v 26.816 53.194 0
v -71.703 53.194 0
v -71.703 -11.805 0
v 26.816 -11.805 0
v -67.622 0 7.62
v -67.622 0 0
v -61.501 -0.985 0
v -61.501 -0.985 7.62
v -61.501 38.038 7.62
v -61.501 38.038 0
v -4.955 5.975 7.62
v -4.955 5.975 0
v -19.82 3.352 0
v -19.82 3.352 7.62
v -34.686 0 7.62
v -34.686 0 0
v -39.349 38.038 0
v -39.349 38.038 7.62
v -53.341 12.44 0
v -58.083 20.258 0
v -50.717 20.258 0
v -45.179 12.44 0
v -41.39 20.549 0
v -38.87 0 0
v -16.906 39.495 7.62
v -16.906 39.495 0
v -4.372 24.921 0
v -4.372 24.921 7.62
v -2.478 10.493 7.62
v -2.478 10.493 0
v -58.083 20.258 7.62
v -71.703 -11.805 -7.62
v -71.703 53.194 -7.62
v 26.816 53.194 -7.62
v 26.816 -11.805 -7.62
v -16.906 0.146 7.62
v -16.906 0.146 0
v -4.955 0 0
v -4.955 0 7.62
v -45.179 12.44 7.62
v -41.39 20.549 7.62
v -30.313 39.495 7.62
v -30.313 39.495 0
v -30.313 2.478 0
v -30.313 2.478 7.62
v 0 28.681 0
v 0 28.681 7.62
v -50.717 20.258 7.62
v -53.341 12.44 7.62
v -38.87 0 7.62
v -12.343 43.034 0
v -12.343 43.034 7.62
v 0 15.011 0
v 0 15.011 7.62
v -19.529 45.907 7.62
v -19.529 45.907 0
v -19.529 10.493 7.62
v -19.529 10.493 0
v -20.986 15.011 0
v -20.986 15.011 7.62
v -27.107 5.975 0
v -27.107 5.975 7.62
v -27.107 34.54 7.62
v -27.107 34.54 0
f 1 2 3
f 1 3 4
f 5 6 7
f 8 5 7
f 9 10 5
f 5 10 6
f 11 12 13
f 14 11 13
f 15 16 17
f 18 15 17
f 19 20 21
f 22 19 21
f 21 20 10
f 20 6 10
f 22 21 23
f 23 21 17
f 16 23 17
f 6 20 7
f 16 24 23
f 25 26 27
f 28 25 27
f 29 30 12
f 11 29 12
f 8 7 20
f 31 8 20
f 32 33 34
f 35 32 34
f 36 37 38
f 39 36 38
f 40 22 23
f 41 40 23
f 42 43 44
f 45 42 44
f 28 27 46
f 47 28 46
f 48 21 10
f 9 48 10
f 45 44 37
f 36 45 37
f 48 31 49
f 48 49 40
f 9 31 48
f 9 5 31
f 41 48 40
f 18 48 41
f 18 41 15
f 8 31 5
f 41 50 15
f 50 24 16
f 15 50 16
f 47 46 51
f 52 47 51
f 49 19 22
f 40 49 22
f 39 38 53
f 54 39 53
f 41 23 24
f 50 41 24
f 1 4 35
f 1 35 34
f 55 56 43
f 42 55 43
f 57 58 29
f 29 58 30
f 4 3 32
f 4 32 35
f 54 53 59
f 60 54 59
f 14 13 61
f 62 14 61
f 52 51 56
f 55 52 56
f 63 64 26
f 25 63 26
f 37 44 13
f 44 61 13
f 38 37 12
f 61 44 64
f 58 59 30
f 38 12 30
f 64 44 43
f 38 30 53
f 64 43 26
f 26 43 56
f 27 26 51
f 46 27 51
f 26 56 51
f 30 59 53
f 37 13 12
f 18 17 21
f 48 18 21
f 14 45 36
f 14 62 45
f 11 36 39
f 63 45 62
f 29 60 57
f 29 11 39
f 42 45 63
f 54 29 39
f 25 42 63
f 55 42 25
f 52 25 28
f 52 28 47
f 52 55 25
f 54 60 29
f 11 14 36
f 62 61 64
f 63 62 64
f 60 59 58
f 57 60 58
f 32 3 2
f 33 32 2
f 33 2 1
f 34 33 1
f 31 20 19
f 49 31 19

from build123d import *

# Parameters (mm, degrees)
F1_DEPTH = 7.62
F2_W     = 98.518687
F2_H     = 64.999017
F3_DEPTH = 7.62


with BuildPart() as f1:
    # F0 (on Top) → F1 (new body)
    with BuildSketch(Plane.XY):
        Polygon((-61.501313, 38.037542), (-67.622297, 0), (-61.501313, -0.984986), (-58.082975, 20.257542), (-53.340985, 12.439668), (-45.178689, 12.439668), (-41.38951, 20.549016), (-38.870091, 0), (-34.685574, 0), (-39.34918, 38.037542), (-50.716721, 20.257542), align=None)
        Polygon((-16.905574, 39.494921), (-4.372131, 24.921147), (0, 28.681179), (-12.343235, 43.03378), (-19.528853, 45.907374), (-30.313443, 39.494921), (-30.313443, 2.477541), (-16.905574, 0.145738), (-4.955082, 0), (0, 15.010984), (-2.477541, 10.493115), (-4.955082, 5.975246), (-19.820329, 3.351967), (-27.107213, 5.975246), (-27.107213, 21.714916), (-27.107213, 34.539837), align=None)
        Polygon((-19.528853, 10.493115), (-2.477541, 10.493115), (0, 15.010984), (-20.986229, 15.010984), align=None)
    extrude(amount=F1_DEPTH)


with BuildPart() as f3:
    # F2 (on Top) → F3 (new body)
    with BuildSketch(Plane.XY):
        with Locations((-22.443607, 20.694753)):
            Rectangle(F2_W, F2_H)
    extrude(amount=-F3_DEPTH)


solid = Compound([f1.part, f3.part])
